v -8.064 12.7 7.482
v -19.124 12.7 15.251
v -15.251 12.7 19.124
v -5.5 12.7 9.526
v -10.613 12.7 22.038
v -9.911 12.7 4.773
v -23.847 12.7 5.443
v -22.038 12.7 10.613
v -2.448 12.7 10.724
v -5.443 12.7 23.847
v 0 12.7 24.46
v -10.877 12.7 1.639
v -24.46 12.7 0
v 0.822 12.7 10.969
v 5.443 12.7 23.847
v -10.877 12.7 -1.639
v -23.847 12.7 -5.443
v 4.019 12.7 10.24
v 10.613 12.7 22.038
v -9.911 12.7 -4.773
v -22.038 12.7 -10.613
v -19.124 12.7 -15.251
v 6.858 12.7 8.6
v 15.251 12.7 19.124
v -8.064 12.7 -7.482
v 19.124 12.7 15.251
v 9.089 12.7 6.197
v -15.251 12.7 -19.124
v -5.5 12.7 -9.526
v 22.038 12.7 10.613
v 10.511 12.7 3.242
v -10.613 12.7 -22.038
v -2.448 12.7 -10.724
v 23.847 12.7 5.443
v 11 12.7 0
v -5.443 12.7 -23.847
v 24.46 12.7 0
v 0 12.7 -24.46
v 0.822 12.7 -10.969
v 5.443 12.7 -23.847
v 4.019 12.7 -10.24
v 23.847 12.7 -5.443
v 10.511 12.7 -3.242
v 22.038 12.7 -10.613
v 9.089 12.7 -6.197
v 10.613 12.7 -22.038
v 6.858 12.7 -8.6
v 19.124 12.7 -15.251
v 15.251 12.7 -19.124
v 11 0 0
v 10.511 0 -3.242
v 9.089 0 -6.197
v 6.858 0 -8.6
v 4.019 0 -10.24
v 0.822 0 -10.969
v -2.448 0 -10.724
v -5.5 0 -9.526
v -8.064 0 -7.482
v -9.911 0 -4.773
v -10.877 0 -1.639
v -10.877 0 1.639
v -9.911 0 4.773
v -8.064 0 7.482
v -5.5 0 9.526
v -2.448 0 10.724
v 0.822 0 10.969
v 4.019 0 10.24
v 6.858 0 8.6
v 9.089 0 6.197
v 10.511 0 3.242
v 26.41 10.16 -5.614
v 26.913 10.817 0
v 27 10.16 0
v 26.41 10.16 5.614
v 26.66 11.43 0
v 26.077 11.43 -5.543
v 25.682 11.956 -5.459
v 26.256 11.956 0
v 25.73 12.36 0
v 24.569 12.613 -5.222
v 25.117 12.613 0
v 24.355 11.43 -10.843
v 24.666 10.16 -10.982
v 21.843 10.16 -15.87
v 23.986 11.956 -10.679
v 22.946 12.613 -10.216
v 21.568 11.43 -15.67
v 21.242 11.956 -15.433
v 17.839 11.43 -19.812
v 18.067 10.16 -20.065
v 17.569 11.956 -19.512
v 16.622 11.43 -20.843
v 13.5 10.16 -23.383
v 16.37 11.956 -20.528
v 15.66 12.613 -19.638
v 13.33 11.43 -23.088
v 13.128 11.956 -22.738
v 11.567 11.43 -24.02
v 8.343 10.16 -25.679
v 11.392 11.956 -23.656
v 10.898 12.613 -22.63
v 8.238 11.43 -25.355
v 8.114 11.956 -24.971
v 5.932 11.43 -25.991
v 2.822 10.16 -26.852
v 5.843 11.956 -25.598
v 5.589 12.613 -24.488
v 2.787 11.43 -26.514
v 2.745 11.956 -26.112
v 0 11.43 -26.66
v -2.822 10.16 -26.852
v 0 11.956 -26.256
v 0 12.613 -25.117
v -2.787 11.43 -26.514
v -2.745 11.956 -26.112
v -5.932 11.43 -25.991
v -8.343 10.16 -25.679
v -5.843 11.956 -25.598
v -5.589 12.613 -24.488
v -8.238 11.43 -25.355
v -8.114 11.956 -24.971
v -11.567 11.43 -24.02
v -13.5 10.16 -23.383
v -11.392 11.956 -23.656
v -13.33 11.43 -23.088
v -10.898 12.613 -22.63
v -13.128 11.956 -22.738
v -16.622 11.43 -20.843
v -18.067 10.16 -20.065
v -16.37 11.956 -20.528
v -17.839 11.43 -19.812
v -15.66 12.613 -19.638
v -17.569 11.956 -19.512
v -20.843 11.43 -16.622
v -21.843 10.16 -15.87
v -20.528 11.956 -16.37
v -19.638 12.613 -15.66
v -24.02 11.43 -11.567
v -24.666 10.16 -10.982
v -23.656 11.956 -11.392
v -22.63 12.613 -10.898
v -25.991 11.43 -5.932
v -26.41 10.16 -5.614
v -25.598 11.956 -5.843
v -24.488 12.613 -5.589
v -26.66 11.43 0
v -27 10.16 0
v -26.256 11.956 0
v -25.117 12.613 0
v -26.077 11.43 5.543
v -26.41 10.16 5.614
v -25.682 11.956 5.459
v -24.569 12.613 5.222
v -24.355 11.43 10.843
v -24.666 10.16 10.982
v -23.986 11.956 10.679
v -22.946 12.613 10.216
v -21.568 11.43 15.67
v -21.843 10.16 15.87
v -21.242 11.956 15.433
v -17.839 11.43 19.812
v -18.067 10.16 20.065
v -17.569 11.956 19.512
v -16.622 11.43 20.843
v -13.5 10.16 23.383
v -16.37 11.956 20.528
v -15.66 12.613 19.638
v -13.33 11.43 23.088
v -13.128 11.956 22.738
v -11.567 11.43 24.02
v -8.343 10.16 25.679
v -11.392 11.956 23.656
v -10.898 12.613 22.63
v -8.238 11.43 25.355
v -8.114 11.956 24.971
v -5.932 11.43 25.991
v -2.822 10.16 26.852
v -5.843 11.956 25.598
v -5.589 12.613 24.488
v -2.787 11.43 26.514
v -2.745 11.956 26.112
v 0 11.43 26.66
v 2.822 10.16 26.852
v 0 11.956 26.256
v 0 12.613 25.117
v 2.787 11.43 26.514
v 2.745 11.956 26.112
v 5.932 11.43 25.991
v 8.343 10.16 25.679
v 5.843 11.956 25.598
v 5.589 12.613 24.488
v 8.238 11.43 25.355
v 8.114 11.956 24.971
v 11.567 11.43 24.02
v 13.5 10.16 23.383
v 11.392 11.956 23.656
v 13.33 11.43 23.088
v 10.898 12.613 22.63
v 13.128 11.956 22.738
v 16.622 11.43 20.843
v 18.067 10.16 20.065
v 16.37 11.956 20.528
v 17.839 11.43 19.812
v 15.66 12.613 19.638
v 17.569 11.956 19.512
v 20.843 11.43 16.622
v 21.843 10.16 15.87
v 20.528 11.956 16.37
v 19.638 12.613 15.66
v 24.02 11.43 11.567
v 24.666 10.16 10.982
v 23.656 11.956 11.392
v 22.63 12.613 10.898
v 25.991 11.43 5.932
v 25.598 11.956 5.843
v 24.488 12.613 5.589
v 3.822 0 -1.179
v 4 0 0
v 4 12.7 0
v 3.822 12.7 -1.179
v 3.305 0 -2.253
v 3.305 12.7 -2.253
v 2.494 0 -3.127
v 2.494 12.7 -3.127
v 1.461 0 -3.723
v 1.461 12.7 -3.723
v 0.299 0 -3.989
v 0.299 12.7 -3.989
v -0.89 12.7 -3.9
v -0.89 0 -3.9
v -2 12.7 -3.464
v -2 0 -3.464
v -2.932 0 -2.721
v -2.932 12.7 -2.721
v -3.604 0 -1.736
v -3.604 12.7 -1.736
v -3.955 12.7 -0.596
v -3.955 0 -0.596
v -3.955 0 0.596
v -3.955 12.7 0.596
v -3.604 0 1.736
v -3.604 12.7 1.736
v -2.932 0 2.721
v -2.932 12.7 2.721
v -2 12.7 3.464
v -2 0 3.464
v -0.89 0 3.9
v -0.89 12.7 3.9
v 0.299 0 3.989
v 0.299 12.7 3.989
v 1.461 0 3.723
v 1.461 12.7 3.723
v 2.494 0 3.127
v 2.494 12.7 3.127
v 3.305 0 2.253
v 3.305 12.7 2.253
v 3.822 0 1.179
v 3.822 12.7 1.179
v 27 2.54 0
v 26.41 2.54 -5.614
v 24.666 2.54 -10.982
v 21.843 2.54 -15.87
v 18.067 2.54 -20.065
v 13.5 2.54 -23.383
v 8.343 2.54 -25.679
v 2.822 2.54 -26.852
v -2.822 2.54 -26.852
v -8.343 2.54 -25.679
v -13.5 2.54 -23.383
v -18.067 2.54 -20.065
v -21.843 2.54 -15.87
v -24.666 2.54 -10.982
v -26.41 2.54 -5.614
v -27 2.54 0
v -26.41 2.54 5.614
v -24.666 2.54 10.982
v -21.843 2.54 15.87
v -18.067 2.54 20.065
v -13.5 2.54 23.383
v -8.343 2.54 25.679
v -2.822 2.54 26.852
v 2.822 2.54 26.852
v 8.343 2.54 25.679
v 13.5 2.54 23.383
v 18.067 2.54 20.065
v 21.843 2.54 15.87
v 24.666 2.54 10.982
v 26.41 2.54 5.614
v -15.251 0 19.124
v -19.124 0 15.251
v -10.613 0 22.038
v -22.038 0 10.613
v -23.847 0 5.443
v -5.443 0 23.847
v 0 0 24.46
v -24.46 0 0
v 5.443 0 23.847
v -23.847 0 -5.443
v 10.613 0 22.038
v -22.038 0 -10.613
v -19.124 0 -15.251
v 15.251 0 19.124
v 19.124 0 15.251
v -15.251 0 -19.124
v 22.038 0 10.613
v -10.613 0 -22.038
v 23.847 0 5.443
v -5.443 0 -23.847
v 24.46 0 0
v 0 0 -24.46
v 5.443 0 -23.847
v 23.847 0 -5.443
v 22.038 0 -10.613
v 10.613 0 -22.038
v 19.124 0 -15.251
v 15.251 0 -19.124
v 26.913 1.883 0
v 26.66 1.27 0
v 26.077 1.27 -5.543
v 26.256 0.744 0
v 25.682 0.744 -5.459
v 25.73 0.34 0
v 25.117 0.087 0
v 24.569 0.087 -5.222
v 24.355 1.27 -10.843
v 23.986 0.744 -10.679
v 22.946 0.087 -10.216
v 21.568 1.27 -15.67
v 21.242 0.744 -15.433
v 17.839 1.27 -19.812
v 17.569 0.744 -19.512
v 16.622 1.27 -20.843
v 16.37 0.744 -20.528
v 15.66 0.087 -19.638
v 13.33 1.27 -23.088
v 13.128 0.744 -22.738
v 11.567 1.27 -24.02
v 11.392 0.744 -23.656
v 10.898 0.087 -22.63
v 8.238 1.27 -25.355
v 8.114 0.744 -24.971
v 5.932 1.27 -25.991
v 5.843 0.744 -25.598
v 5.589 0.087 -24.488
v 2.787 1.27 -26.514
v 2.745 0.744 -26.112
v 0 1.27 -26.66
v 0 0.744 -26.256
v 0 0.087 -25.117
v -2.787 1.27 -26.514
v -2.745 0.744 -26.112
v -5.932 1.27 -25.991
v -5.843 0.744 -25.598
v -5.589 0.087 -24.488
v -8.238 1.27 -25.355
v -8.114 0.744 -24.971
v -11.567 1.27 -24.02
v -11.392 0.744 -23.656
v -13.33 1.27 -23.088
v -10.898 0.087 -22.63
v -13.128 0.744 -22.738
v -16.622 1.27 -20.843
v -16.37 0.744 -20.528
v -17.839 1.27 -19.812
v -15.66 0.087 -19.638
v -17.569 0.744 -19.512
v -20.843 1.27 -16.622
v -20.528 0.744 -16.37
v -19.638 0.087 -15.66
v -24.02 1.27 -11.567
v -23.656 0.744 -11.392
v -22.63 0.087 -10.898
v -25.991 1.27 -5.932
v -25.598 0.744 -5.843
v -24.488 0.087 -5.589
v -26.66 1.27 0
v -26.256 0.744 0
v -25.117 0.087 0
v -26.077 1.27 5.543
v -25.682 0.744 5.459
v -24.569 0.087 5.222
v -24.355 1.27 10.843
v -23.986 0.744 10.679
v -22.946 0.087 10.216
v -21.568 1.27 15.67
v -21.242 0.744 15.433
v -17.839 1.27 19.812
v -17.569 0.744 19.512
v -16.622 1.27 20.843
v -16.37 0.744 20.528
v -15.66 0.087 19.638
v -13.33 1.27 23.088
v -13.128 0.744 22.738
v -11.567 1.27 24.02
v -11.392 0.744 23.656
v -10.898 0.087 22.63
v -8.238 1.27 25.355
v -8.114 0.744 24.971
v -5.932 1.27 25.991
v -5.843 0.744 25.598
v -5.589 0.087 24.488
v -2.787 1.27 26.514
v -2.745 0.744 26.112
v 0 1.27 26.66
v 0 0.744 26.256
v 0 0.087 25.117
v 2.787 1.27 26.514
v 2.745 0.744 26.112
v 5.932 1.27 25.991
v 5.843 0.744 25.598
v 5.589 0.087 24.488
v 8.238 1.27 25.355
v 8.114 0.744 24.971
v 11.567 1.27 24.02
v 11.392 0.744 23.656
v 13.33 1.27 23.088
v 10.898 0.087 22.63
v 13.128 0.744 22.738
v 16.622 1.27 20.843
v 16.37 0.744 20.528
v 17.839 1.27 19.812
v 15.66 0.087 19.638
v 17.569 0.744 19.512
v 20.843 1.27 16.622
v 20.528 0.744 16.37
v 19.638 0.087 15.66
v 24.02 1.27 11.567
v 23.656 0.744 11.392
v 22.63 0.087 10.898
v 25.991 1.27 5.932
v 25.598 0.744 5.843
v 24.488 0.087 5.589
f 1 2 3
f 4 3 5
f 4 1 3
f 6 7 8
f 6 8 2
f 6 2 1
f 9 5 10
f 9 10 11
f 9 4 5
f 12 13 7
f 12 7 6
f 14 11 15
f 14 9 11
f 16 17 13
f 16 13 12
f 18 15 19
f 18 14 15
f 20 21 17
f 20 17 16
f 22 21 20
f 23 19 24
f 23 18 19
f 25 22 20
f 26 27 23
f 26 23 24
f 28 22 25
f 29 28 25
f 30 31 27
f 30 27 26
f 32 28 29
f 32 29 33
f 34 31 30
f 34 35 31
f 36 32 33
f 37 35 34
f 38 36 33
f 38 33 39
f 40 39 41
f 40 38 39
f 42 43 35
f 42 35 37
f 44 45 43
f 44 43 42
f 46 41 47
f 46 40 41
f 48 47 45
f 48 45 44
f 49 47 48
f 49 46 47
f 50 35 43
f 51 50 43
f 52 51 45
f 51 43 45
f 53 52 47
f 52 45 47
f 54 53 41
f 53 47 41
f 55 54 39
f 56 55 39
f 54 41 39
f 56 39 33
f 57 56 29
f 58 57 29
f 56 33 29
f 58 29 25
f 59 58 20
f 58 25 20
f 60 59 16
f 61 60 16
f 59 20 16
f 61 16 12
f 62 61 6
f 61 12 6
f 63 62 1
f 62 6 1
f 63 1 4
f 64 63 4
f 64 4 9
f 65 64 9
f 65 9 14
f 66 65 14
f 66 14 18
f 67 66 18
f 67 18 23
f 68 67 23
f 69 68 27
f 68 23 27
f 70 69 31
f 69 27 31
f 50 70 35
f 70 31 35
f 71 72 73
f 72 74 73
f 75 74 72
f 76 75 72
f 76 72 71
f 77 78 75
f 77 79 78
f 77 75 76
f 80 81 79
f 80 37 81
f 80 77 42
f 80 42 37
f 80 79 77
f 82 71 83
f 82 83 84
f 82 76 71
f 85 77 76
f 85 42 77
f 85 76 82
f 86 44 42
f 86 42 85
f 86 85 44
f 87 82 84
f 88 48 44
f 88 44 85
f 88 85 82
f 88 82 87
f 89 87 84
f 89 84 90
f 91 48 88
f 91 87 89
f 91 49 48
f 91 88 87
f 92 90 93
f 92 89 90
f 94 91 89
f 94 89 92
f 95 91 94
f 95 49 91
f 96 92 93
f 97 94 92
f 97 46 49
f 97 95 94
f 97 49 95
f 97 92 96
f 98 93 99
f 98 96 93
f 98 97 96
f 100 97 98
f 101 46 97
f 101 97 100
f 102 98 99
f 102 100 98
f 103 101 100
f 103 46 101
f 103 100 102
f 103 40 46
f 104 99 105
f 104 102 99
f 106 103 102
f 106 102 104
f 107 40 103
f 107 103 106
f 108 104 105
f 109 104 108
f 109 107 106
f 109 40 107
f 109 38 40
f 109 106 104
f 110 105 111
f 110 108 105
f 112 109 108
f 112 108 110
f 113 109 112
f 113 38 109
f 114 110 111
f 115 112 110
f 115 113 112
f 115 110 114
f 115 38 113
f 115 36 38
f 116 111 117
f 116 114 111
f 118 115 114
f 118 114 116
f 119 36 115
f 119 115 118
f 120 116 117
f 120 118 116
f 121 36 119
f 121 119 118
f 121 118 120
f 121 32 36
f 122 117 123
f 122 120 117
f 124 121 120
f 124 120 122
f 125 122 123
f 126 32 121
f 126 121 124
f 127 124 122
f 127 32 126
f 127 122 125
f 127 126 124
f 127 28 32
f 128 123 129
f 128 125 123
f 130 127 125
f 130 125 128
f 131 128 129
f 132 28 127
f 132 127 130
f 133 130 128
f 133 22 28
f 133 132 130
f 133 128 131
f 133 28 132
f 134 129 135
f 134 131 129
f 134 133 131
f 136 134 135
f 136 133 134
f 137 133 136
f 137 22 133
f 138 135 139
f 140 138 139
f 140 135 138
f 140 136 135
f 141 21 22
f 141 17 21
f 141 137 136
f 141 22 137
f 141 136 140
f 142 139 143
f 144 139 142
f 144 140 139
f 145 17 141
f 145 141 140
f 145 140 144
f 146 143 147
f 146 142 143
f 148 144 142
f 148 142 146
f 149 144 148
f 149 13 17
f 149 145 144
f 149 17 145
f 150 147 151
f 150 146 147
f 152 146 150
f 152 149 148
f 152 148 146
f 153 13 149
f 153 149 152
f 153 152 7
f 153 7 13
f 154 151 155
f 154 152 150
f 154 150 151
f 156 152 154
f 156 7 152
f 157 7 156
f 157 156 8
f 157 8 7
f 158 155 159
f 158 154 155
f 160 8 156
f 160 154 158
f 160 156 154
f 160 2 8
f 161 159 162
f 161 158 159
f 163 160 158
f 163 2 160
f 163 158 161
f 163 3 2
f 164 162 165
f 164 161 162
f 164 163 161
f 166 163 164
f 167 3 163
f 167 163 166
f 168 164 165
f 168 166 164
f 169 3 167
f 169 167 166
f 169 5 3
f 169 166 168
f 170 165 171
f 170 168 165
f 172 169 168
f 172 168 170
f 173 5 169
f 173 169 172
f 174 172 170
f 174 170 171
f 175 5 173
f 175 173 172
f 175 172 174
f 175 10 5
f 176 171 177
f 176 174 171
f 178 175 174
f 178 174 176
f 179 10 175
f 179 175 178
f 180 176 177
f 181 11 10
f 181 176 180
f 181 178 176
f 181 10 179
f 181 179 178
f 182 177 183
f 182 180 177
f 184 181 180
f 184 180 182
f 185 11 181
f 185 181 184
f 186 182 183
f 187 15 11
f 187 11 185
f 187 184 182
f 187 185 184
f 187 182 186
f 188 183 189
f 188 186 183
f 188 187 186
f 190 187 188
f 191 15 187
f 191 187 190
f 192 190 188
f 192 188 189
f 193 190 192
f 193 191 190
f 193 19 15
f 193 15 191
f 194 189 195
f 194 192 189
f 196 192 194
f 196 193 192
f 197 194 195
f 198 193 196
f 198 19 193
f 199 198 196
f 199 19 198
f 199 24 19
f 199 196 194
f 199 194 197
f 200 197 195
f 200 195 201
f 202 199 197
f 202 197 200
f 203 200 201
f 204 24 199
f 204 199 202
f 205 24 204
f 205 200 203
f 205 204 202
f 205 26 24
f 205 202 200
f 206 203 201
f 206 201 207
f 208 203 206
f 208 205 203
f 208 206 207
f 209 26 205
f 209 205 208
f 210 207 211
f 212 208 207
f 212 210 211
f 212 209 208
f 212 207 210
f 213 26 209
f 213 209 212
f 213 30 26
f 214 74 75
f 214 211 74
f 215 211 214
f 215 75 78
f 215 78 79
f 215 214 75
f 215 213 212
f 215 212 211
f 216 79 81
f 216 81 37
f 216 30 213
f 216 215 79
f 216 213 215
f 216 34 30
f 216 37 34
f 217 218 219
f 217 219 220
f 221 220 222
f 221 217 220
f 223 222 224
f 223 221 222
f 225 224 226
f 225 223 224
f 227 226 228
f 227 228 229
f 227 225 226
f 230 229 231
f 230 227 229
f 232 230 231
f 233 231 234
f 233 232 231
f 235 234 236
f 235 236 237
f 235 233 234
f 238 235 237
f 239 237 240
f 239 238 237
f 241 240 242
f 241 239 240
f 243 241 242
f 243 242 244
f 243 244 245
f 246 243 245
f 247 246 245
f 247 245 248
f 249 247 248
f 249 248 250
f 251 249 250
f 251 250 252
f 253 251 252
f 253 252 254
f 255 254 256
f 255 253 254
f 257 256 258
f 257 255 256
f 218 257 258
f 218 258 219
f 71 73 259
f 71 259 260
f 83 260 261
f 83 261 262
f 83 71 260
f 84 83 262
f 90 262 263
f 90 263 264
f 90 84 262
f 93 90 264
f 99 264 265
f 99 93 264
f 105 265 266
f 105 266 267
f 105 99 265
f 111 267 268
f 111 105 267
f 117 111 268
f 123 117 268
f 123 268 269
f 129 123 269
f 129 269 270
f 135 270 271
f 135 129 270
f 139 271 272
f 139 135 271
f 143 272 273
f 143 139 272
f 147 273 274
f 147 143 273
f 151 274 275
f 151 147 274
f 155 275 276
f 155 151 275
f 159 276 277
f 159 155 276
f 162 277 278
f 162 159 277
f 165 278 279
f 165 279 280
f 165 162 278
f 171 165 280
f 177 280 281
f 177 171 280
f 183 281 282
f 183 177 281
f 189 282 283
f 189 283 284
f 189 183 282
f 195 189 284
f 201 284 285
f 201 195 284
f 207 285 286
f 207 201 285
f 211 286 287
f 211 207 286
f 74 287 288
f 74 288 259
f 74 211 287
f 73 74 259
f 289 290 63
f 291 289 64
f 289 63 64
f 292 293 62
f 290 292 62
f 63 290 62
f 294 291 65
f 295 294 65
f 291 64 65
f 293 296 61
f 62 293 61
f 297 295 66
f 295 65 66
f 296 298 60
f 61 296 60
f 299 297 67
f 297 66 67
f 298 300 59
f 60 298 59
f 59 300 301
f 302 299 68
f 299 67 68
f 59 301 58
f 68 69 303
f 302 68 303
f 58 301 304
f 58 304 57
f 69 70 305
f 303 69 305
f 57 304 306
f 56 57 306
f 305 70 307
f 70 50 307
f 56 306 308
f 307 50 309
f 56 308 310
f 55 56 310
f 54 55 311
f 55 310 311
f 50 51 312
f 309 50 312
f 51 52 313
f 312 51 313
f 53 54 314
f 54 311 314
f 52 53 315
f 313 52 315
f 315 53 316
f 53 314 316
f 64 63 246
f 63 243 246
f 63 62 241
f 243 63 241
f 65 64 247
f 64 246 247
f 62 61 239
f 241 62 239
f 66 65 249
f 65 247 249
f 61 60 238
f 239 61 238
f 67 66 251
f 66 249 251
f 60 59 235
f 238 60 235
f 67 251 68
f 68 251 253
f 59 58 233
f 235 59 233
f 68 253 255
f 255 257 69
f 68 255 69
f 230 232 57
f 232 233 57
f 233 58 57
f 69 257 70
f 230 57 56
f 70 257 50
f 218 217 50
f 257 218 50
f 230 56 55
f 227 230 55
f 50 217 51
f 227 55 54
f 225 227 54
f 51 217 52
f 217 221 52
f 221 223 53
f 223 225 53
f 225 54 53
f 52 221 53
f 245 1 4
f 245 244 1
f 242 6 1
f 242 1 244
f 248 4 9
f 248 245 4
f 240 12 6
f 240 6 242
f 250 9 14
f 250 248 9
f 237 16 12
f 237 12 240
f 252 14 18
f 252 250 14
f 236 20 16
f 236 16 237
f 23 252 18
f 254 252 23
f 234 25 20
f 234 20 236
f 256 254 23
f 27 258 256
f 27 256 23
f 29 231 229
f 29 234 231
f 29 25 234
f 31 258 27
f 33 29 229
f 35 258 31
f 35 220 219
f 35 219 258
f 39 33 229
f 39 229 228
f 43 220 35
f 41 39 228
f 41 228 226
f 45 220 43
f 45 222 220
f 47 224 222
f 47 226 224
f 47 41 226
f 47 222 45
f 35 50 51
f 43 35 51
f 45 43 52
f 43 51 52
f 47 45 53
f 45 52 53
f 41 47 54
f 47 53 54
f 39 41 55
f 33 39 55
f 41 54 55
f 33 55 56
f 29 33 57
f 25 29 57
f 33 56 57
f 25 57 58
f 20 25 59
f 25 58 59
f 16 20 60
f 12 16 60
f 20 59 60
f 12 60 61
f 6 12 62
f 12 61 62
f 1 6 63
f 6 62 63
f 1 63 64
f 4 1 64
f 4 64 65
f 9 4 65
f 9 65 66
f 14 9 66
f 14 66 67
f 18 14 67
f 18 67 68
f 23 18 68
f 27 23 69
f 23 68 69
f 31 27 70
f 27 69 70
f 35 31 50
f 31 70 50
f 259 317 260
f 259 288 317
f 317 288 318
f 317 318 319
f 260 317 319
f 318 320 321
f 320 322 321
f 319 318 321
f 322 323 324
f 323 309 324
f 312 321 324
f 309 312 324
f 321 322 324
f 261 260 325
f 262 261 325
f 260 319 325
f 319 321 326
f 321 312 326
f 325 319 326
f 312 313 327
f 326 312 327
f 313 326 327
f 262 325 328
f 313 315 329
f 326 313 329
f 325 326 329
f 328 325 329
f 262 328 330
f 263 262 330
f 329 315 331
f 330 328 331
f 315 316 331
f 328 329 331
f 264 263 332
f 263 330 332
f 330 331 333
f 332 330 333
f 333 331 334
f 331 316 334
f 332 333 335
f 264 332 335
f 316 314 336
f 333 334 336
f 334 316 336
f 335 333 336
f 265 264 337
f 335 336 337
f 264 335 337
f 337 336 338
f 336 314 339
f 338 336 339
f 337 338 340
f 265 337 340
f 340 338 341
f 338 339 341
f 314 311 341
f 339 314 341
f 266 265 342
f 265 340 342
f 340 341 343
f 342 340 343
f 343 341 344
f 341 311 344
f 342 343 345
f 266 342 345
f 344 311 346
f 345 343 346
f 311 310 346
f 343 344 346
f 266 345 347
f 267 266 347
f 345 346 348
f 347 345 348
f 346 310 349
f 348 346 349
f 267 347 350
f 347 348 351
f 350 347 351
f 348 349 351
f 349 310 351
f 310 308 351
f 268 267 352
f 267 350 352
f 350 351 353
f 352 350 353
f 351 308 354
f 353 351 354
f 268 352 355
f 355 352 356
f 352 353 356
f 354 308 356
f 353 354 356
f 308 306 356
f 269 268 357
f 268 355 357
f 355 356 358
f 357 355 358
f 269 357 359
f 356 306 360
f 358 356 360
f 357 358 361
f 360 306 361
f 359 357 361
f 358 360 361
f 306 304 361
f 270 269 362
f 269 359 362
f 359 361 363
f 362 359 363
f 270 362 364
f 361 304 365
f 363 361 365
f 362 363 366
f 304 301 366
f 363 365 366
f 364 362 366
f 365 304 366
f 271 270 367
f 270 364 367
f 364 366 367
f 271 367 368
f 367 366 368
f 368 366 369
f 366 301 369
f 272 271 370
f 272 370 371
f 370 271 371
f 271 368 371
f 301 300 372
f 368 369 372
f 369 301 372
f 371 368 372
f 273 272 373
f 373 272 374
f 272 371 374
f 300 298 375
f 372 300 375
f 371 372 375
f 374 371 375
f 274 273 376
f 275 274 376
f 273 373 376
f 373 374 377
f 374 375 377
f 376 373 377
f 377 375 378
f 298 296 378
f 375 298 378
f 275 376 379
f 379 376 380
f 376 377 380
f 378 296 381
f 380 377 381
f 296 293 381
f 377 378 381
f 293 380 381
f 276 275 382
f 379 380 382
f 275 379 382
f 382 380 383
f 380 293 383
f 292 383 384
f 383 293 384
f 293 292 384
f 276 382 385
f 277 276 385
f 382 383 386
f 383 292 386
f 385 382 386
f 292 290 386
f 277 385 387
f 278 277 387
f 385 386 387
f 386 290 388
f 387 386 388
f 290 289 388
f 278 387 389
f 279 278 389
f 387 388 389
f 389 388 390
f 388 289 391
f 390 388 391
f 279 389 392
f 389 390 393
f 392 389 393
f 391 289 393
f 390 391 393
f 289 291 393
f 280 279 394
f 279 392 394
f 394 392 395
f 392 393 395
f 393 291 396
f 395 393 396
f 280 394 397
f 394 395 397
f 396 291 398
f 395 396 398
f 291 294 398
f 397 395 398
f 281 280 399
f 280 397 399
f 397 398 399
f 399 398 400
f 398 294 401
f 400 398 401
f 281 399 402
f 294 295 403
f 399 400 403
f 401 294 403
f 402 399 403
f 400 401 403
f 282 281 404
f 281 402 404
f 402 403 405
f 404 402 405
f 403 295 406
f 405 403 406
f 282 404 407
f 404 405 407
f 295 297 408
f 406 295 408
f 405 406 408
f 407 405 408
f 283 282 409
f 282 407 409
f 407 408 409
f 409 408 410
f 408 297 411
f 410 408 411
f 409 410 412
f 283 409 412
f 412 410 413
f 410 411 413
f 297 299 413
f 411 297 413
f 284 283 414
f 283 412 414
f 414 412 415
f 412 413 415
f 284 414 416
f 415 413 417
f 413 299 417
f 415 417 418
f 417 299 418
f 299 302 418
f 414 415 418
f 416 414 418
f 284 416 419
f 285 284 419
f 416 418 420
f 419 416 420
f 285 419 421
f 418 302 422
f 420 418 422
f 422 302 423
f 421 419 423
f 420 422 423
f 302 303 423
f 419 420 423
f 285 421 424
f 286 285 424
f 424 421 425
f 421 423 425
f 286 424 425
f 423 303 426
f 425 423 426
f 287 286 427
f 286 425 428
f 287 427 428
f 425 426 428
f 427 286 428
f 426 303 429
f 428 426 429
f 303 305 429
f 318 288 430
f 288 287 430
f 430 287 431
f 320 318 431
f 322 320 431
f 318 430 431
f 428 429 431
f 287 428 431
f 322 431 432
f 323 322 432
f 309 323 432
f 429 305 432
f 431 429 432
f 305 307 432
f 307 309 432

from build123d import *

# Parameters (mm, degrees)
SKETCH1_R           = 11
SKETCH1_R_2         = 4
BOSS_EXTRUDE1_DEPTH = 12.7
SKETCH2_R           = 27
SKETCH2_R_2         = 11
BOSS_EXTRUDE2_DEPTH = 12.7
FILLET1_R           = 2.54


with BuildPart() as part:
    # Sketch1 → Boss-Extrude1 (new body)
    with BuildSketch(Plane(origin=(0, 0, 0), x_dir=(1, 0, 0), z_dir=(0, 1, 0))):
        Circle(SKETCH1_R)
        Circle(SKETCH1_R_2, mode=Mode.SUBTRACT)
    extrude(amount=BOSS_EXTRUDE1_DEPTH)


with BuildPart() as body_2:
    # Sketch2 → Boss-Extrude2 (new body)
    with BuildSketch(Plane(origin=(0, 12.7, 0), x_dir=(1, 0, 0), z_dir=(0, 1, 0))):
        Circle(SKETCH2_R)
        Circle(SKETCH2_R_2, mode=Mode.SUBTRACT)
    extrude(amount=-BOSS_EXTRUDE2_DEPTH)

    # Fillet1
    fillet1_edges = [body_2.edges().sort_by_distance(p)[0] for p in [
        (-27, 12.7, 0),
        (-27, 0, 0),
    ]]
    fillet(fillet1_edges, radius=FILLET1_R)


solid = Compound([part.part, body_2.part])
